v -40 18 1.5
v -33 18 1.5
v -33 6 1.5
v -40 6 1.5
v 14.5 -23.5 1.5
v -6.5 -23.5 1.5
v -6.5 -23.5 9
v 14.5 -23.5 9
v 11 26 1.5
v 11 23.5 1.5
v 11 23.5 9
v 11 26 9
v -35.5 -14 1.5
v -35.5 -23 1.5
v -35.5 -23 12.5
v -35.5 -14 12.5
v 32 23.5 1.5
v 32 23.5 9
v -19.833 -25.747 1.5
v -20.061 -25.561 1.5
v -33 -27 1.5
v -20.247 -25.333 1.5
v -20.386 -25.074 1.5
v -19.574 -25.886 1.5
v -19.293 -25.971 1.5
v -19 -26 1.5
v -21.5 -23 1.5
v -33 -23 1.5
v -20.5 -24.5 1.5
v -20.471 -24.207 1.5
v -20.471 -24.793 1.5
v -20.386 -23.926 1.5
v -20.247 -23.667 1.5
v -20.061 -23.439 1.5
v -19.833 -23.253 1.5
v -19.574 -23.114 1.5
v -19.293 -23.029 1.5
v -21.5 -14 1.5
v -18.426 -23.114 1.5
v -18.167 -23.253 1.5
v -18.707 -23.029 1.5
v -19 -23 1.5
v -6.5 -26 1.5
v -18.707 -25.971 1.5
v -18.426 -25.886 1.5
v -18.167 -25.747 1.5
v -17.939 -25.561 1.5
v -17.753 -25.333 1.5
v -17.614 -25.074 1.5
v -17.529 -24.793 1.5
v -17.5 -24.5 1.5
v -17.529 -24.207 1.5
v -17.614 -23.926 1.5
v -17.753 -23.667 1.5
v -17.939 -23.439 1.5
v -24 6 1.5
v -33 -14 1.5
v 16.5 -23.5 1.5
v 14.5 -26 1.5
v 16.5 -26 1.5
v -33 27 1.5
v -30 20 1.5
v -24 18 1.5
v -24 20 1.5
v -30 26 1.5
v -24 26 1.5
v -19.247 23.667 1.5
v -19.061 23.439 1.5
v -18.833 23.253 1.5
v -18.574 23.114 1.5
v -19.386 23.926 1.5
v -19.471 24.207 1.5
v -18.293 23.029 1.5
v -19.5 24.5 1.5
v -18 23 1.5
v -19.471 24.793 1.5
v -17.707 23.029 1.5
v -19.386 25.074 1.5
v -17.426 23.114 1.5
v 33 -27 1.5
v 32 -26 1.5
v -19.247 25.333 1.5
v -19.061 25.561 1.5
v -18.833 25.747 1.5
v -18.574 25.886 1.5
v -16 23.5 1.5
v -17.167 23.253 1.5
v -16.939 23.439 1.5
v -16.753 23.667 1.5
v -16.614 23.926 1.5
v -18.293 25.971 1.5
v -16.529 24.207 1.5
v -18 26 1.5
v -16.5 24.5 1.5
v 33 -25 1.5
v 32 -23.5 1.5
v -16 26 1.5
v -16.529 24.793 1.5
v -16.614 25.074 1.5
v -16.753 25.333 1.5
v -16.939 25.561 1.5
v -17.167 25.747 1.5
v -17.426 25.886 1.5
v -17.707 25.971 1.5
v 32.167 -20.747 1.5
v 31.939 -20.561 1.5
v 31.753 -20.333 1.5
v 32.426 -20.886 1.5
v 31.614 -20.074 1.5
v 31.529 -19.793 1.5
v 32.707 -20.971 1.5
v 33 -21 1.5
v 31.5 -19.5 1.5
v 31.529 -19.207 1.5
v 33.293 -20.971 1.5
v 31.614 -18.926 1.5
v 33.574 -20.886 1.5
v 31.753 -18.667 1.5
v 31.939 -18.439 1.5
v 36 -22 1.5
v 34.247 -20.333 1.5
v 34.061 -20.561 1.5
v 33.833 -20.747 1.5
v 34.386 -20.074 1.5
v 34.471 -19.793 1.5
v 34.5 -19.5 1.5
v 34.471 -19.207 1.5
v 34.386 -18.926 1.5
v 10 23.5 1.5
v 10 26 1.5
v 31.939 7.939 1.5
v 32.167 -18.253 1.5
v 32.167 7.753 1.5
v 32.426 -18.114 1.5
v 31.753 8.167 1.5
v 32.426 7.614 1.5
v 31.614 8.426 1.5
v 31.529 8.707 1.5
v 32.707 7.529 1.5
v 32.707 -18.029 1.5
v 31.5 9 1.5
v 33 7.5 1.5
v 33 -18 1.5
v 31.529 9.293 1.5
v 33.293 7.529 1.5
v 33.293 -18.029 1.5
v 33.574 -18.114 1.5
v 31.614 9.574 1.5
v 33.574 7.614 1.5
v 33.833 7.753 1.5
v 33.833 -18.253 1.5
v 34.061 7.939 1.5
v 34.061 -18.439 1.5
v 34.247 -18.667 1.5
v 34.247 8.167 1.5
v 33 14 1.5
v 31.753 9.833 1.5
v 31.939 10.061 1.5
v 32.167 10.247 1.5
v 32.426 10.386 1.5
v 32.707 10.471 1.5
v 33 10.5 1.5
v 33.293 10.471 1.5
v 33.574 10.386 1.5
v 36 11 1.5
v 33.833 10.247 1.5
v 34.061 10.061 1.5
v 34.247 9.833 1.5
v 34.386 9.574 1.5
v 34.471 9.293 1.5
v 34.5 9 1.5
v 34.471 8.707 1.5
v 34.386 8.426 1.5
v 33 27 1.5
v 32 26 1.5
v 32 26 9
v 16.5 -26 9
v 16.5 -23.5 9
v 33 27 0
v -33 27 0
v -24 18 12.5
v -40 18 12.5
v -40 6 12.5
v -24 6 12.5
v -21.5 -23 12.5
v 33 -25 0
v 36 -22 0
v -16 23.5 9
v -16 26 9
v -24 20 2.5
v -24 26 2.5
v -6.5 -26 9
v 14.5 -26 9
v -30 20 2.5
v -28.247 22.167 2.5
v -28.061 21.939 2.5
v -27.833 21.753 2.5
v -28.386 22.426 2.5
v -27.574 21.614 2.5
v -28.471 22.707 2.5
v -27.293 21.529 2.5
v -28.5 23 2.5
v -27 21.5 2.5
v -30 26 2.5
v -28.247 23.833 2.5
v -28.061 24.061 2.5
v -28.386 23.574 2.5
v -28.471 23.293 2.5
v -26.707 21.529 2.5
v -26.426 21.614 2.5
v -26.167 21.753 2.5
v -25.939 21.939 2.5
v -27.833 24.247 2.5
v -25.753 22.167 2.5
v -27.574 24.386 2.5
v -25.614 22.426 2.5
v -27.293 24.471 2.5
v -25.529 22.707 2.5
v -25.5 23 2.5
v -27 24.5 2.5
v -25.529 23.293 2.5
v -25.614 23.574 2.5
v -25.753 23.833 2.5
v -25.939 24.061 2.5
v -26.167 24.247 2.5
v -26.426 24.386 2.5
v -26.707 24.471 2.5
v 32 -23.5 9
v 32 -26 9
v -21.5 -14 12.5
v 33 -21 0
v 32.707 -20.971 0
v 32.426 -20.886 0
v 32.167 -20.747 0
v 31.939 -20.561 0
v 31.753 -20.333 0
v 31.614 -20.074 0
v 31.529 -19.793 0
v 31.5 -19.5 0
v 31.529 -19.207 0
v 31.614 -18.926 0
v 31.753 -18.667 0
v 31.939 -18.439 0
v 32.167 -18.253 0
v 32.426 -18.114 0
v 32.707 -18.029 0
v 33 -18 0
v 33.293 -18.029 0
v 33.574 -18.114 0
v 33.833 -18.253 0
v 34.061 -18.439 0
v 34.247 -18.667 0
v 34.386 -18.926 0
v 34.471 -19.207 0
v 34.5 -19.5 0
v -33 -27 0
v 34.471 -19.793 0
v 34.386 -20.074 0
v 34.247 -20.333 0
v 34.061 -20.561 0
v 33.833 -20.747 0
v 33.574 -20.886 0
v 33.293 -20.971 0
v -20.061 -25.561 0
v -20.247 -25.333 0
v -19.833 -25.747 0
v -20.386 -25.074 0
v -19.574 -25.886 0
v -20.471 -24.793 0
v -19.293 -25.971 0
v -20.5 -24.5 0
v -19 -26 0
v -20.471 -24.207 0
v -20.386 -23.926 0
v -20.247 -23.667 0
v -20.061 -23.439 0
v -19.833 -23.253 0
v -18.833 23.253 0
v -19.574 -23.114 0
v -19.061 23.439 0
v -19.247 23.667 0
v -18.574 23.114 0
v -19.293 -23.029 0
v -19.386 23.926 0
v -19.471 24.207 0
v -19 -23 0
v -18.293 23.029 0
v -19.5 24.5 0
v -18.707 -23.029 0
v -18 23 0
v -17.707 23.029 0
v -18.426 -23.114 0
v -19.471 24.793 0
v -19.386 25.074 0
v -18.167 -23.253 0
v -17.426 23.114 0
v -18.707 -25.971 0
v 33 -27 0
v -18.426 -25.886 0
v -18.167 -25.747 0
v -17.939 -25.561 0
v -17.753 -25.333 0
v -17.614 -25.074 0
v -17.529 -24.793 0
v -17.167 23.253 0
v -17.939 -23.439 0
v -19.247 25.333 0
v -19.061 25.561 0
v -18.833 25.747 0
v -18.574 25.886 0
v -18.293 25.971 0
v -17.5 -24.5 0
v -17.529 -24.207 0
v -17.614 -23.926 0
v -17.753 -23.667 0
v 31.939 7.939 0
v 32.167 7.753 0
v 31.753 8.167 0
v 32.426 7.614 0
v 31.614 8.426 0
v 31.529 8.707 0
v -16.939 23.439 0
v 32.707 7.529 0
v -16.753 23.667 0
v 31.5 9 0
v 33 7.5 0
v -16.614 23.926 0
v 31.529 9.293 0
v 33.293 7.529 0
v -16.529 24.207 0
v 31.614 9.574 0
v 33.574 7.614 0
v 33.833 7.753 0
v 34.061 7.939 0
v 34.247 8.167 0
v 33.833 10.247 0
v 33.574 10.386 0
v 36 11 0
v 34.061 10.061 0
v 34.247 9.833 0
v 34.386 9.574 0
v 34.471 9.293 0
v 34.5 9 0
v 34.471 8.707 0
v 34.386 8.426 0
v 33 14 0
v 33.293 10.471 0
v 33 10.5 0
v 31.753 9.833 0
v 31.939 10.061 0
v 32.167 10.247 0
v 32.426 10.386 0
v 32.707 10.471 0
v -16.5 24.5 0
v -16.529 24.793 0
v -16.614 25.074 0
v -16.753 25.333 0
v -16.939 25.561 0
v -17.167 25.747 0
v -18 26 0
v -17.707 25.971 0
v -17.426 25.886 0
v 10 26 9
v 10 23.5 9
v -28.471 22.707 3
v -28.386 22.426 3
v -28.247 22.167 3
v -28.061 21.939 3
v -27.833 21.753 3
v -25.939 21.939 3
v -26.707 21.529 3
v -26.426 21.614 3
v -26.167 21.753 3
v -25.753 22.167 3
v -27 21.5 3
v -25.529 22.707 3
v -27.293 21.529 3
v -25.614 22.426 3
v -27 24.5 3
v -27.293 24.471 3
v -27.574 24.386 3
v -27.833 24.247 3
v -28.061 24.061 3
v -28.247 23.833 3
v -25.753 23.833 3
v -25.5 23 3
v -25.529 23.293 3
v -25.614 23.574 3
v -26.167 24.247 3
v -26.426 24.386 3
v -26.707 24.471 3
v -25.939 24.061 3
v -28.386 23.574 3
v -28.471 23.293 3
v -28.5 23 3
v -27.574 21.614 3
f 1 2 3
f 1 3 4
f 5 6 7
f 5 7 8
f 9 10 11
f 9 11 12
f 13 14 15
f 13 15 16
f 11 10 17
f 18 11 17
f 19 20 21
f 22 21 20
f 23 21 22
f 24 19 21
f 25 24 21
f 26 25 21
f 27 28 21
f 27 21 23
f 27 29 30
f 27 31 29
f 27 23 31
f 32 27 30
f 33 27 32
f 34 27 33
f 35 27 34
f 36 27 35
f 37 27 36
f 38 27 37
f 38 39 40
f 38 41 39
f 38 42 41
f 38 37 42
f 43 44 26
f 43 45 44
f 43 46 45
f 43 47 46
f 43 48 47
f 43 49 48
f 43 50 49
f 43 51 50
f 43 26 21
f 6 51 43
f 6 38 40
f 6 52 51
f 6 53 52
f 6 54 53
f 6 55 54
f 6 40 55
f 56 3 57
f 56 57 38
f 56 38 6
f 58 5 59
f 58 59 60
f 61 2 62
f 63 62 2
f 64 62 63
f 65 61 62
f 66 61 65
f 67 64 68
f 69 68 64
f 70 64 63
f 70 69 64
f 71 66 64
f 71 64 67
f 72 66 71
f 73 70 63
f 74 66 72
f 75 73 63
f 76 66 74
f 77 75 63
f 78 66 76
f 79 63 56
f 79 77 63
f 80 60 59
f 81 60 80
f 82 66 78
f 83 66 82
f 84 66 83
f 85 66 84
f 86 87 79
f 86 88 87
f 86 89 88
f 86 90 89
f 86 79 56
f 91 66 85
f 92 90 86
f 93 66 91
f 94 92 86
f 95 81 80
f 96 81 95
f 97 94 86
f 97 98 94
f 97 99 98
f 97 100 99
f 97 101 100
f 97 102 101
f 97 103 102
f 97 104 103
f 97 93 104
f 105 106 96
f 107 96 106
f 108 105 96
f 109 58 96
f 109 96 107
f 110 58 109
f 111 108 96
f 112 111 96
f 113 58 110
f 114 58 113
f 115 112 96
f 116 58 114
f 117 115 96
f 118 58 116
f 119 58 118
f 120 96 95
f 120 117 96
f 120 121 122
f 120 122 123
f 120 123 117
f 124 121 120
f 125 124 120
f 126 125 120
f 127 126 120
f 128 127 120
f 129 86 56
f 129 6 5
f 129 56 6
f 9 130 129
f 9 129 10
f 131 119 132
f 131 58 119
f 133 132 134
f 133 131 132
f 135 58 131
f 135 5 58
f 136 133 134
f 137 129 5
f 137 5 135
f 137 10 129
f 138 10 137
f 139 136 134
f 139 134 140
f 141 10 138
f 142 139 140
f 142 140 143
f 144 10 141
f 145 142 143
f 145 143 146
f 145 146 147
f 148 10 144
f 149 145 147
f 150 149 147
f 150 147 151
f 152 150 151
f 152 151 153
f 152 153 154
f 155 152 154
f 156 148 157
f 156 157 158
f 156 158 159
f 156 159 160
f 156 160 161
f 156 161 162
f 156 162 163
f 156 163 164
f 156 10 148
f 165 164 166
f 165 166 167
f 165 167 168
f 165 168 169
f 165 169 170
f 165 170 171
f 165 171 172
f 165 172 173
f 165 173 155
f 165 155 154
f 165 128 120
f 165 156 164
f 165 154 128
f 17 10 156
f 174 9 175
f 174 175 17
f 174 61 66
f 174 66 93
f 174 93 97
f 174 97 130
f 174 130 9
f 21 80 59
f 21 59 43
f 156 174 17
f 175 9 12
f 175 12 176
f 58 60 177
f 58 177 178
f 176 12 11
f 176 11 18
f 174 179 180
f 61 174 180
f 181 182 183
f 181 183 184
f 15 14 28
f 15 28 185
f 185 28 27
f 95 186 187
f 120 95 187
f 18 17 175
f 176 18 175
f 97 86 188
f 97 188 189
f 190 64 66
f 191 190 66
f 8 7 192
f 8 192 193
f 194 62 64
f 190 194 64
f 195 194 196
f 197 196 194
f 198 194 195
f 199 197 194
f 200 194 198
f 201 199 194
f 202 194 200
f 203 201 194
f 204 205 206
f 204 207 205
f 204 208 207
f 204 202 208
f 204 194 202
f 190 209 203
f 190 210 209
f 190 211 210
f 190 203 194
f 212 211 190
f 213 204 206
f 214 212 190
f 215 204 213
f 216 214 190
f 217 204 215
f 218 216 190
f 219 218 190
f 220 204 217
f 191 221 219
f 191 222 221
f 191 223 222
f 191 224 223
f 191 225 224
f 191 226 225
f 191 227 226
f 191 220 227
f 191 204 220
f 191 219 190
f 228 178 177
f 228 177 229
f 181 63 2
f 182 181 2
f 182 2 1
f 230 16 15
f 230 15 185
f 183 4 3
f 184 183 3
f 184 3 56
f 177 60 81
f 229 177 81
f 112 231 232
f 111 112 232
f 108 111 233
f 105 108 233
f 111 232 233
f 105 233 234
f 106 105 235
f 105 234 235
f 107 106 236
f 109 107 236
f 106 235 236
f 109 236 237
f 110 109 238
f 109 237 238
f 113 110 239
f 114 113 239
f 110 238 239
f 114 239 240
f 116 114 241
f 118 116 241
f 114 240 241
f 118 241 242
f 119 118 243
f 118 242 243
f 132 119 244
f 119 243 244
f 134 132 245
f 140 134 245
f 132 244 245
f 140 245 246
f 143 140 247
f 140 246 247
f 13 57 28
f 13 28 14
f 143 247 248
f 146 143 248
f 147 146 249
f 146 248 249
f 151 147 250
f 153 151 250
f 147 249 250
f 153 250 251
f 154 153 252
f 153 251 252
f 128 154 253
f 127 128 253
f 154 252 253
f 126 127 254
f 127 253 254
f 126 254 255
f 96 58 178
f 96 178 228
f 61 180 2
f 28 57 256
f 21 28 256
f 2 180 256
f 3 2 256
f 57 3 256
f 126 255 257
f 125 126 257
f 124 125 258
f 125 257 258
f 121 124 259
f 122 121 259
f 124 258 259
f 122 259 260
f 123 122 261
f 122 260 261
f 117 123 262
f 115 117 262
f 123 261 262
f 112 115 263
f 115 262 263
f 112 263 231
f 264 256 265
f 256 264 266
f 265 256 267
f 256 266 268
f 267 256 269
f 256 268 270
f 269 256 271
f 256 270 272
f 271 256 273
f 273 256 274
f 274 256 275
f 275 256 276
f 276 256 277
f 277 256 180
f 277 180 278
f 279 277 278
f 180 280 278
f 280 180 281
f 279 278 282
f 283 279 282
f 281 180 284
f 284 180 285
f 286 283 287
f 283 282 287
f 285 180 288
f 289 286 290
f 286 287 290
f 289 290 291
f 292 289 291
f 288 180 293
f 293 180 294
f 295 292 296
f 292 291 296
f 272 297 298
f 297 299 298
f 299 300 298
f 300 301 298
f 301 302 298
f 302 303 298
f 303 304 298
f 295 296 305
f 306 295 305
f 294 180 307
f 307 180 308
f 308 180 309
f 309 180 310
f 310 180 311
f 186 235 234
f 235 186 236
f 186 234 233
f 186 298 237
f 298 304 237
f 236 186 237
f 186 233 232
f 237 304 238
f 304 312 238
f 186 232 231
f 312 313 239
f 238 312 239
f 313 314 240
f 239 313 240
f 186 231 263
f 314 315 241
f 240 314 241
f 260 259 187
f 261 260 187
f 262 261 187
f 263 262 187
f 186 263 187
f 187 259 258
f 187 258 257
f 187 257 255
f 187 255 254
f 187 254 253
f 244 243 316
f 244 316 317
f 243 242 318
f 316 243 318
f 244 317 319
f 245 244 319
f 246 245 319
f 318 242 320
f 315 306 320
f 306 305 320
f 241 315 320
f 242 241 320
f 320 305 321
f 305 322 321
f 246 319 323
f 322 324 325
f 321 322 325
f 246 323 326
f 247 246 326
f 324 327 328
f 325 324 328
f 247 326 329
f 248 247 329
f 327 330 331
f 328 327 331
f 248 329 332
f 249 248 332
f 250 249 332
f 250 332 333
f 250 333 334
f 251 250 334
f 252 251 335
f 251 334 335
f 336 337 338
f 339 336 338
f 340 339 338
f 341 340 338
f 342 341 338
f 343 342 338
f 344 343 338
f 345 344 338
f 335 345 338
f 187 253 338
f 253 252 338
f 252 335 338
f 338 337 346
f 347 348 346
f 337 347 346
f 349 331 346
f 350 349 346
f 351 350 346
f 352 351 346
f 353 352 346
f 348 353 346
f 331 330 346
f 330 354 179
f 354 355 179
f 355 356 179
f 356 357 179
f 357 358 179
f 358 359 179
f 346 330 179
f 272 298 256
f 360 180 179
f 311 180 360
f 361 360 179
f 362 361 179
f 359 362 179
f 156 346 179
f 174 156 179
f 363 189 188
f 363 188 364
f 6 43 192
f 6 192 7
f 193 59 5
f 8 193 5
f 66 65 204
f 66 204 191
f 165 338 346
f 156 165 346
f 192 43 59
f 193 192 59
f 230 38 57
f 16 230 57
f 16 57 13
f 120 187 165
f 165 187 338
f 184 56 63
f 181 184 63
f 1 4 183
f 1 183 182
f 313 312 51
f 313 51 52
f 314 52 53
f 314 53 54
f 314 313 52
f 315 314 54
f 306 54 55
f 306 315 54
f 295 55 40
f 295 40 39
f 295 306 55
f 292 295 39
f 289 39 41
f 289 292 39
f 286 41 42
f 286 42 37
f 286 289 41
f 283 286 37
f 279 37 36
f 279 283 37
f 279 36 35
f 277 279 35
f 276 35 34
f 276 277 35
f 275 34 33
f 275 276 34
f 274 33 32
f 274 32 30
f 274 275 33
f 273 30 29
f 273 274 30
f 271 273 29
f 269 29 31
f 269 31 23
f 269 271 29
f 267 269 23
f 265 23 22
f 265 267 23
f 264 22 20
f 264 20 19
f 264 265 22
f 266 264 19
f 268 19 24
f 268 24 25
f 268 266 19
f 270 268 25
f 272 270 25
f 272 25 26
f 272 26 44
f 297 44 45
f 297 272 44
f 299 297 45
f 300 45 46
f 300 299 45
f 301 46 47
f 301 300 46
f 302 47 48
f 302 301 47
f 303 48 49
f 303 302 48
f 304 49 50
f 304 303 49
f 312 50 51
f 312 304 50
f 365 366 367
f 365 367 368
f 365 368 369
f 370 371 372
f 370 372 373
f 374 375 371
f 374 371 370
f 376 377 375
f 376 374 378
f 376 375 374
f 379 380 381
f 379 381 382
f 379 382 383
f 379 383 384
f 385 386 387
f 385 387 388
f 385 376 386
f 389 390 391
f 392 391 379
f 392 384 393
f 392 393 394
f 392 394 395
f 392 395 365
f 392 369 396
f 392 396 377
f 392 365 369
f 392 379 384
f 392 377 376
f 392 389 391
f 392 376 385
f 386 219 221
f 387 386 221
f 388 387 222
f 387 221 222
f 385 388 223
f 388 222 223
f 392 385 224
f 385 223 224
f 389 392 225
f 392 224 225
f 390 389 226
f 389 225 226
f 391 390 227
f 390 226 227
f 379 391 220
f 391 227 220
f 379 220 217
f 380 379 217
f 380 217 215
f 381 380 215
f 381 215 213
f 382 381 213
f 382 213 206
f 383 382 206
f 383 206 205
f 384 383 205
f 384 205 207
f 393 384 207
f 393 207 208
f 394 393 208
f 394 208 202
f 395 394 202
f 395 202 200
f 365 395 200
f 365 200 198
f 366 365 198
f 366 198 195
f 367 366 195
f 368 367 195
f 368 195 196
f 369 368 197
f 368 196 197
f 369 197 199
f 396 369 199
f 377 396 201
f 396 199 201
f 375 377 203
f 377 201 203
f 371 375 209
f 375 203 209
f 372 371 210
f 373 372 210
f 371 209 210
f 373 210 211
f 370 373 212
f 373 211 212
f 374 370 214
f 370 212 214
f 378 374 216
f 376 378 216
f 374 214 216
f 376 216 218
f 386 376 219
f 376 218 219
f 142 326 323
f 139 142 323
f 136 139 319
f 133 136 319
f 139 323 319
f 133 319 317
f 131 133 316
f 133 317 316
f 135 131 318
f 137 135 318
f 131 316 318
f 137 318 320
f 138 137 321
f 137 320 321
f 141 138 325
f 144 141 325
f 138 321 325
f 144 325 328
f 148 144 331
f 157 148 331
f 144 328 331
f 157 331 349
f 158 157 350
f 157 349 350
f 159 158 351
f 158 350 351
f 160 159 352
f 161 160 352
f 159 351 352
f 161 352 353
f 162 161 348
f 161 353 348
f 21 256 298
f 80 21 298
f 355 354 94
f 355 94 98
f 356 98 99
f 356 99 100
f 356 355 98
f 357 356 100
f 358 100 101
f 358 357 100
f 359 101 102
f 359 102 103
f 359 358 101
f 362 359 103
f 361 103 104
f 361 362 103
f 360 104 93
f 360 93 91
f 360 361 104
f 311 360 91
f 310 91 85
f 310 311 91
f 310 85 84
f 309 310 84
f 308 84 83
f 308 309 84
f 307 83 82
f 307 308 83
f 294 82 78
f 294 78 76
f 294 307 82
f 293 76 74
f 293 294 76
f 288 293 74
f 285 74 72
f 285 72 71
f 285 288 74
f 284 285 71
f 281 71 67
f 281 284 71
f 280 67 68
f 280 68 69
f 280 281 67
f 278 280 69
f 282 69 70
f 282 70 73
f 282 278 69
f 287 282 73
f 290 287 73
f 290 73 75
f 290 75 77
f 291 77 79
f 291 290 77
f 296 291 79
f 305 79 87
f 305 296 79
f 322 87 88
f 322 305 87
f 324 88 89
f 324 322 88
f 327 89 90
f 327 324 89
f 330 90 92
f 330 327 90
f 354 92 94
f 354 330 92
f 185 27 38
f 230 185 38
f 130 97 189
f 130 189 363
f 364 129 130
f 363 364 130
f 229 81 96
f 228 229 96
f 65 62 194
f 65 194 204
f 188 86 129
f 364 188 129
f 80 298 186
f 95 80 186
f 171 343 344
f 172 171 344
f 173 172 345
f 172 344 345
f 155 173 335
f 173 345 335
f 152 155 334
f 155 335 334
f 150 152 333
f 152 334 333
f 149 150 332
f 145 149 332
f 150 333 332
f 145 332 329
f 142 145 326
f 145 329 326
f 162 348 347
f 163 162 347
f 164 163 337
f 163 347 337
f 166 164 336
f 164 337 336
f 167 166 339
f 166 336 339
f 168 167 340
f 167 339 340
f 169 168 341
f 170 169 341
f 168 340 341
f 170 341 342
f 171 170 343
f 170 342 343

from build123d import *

# Parameters (mm, degrees)
F0_R     = 1.5
F0_W     = 21
F0_H     = 2.5
F0_W_2   = 15.5
F0_W_3   = 6
F0_H_2   = 6
F0_W_4   = 26
F1_DEPTH = 1.5
F2_DEPTH = 9
F3_DEPTH = 2.5
F4_DEPTH = 3
F0_W_5   = 7
F0_H_3   = 12
F0_W_6   = 9
F5_DEPTH = 12.5
F0_W_7   = 11.5
F0_H_4   = 9
F0_W_8   = 2.5
F6_DEPTH = 12.5
F7_W     = 7
F7_H     = 1.5
F8_DEPTH = 45.001


with BuildPart() as f1:
    # F0 (on Top) → F1 (new body)
    with BuildSketch(Plane.XY):
        with BuildLine():
            Line((33, 27), (-33, 27))
            Line((-33, 27), (-33, 18))
            Line((-33, 18), (-24, 18))
            Line((-24, 18), (-24, 6))
            Line((-24, 6), (-33, 6))
            Line((-33, 6), (-33, -14))
            Line((-33, -14), (-21.5, -14))
            Line((-21.5, -14), (-21.5, -23))
            Line((-21.5, -23), (-33, -23))
            Line((-33, -23), (-33, -27))
            Line((-33, -27), (33, -27))
            Line((33, -27), (33, -25))
            Line((33, -25), (33, -21))
            ThreePointArc((33, -21), (31.5, -19.5), (33, -18))
            Line((33, -18), (33, 7.5))
            ThreePointArc((33, 7.5), (31.5, 9), (33, 10.5))
            Line((33, 10.5), (33, 14))
            Line((33, 14), (33, 27))
        make_face()
        with Locations((-19, -24.5)):
            Circle(F0_R, mode=Mode.SUBTRACT)
        with Locations((4, -24.75)):
            Rectangle(F0_W, F0_H, mode=Mode.SUBTRACT)
        with Locations((24.25, -24.75)):
            Rectangle(F0_W_2, F0_H, mode=Mode.SUBTRACT)
        with Locations((-27, 23)):
            Rectangle(F0_W_3, F0_H_2, mode=Mode.SUBTRACT)
        with Locations((-18, 24.5)):
            Circle(F0_R, mode=Mode.SUBTRACT)
        with Locations((-3, 24.75)):
            Rectangle(F0_W_4, F0_H, mode=Mode.SUBTRACT)
        with Locations((21.5, 24.75)):
            Rectangle(F0_W, F0_H, mode=Mode.SUBTRACT)
        with BuildLine():
            Line((36, 11), (33, 14))
            Line((33, 14), (33, 10.5))
            ThreePointArc((33, 10.5), (34.06066, 10.06066), (34.5, 9))
            ThreePointArc((34.5, 9), (34.06066, 7.93934), (33, 7.5))
            Line((33, 7.5), (33, -18))
            ThreePointArc((33, -18), (34.06066, -18.43934), (34.5, -19.5))
            ThreePointArc((34.5, -19.5), (34.06066, -20.56066), (33, -21))
            Line((33, -21), (33, -25))
            Line((33, -25), (36, -22))
            Line((36, -22), (36, 11))
        make_face()
    extrude(amount=F1_DEPTH)

    # F0 (on Top) → F2 (join)
    with BuildSketch(Plane.XY):
        with Locations((-3, 24.75)):
            Rectangle(F0_W_4, F0_H)
        with Locations((21.5, 24.75)):
            Rectangle(F0_W, F0_H)
        with Locations((4, -24.75)):
            Rectangle(F0_W, F0_H)
        with Locations((24.25, -24.75)):
            Rectangle(F0_W_2, F0_H)
    extrude(amount=F2_DEPTH)

    # F0 (on Top) → F3 (join)
    with BuildSketch(Plane.XY):
        with Locations((-27, 23)):
            Rectangle(F0_W_3, F0_H_2)
        with Locations((-27, 23)):
            Circle(F0_R, mode=Mode.SUBTRACT)
    extrude(amount=F3_DEPTH)

    # F0 (on Top) → F4 (join)
    with BuildSketch(Plane.XY):
        with Locations((-27, 23)):
            Circle(F0_R)
    extrude(amount=F4_DEPTH)

    # F0 (on Top) → F5 (join)
    with BuildSketch(Plane.XY):
        with Locations((-36.5, 12)):
            Rectangle(F0_W_5, F0_H_3)
        with Locations((-28.5, 12)):
            Rectangle(F0_W_6, F0_H_3)
    extrude(amount=F5_DEPTH)

    # F0 (on Top) → F6 (join)
    with BuildSketch(Plane.XY):
        with Locations((-27.25, -18.5)):
            Rectangle(F0_W_7, F0_H_4)
        with Locations((-34.25, -18.5)):
            Rectangle(F0_W_8, F0_H_4)
    extrude(amount=F6_DEPTH)

    # F7 (on face) → F8 (cut, through all)
    with BuildSketch(Plane(origin=(0, 18, 0), x_dir=(-1, 0, 0), z_dir=(0, 1, 0))):
        with Locations((36.5, 0.75)):
            Rectangle(F7_W, F7_H)
    extrude(amount=-F8_DEPTH, mode=Mode.SUBTRACT)


solid = f1.part
